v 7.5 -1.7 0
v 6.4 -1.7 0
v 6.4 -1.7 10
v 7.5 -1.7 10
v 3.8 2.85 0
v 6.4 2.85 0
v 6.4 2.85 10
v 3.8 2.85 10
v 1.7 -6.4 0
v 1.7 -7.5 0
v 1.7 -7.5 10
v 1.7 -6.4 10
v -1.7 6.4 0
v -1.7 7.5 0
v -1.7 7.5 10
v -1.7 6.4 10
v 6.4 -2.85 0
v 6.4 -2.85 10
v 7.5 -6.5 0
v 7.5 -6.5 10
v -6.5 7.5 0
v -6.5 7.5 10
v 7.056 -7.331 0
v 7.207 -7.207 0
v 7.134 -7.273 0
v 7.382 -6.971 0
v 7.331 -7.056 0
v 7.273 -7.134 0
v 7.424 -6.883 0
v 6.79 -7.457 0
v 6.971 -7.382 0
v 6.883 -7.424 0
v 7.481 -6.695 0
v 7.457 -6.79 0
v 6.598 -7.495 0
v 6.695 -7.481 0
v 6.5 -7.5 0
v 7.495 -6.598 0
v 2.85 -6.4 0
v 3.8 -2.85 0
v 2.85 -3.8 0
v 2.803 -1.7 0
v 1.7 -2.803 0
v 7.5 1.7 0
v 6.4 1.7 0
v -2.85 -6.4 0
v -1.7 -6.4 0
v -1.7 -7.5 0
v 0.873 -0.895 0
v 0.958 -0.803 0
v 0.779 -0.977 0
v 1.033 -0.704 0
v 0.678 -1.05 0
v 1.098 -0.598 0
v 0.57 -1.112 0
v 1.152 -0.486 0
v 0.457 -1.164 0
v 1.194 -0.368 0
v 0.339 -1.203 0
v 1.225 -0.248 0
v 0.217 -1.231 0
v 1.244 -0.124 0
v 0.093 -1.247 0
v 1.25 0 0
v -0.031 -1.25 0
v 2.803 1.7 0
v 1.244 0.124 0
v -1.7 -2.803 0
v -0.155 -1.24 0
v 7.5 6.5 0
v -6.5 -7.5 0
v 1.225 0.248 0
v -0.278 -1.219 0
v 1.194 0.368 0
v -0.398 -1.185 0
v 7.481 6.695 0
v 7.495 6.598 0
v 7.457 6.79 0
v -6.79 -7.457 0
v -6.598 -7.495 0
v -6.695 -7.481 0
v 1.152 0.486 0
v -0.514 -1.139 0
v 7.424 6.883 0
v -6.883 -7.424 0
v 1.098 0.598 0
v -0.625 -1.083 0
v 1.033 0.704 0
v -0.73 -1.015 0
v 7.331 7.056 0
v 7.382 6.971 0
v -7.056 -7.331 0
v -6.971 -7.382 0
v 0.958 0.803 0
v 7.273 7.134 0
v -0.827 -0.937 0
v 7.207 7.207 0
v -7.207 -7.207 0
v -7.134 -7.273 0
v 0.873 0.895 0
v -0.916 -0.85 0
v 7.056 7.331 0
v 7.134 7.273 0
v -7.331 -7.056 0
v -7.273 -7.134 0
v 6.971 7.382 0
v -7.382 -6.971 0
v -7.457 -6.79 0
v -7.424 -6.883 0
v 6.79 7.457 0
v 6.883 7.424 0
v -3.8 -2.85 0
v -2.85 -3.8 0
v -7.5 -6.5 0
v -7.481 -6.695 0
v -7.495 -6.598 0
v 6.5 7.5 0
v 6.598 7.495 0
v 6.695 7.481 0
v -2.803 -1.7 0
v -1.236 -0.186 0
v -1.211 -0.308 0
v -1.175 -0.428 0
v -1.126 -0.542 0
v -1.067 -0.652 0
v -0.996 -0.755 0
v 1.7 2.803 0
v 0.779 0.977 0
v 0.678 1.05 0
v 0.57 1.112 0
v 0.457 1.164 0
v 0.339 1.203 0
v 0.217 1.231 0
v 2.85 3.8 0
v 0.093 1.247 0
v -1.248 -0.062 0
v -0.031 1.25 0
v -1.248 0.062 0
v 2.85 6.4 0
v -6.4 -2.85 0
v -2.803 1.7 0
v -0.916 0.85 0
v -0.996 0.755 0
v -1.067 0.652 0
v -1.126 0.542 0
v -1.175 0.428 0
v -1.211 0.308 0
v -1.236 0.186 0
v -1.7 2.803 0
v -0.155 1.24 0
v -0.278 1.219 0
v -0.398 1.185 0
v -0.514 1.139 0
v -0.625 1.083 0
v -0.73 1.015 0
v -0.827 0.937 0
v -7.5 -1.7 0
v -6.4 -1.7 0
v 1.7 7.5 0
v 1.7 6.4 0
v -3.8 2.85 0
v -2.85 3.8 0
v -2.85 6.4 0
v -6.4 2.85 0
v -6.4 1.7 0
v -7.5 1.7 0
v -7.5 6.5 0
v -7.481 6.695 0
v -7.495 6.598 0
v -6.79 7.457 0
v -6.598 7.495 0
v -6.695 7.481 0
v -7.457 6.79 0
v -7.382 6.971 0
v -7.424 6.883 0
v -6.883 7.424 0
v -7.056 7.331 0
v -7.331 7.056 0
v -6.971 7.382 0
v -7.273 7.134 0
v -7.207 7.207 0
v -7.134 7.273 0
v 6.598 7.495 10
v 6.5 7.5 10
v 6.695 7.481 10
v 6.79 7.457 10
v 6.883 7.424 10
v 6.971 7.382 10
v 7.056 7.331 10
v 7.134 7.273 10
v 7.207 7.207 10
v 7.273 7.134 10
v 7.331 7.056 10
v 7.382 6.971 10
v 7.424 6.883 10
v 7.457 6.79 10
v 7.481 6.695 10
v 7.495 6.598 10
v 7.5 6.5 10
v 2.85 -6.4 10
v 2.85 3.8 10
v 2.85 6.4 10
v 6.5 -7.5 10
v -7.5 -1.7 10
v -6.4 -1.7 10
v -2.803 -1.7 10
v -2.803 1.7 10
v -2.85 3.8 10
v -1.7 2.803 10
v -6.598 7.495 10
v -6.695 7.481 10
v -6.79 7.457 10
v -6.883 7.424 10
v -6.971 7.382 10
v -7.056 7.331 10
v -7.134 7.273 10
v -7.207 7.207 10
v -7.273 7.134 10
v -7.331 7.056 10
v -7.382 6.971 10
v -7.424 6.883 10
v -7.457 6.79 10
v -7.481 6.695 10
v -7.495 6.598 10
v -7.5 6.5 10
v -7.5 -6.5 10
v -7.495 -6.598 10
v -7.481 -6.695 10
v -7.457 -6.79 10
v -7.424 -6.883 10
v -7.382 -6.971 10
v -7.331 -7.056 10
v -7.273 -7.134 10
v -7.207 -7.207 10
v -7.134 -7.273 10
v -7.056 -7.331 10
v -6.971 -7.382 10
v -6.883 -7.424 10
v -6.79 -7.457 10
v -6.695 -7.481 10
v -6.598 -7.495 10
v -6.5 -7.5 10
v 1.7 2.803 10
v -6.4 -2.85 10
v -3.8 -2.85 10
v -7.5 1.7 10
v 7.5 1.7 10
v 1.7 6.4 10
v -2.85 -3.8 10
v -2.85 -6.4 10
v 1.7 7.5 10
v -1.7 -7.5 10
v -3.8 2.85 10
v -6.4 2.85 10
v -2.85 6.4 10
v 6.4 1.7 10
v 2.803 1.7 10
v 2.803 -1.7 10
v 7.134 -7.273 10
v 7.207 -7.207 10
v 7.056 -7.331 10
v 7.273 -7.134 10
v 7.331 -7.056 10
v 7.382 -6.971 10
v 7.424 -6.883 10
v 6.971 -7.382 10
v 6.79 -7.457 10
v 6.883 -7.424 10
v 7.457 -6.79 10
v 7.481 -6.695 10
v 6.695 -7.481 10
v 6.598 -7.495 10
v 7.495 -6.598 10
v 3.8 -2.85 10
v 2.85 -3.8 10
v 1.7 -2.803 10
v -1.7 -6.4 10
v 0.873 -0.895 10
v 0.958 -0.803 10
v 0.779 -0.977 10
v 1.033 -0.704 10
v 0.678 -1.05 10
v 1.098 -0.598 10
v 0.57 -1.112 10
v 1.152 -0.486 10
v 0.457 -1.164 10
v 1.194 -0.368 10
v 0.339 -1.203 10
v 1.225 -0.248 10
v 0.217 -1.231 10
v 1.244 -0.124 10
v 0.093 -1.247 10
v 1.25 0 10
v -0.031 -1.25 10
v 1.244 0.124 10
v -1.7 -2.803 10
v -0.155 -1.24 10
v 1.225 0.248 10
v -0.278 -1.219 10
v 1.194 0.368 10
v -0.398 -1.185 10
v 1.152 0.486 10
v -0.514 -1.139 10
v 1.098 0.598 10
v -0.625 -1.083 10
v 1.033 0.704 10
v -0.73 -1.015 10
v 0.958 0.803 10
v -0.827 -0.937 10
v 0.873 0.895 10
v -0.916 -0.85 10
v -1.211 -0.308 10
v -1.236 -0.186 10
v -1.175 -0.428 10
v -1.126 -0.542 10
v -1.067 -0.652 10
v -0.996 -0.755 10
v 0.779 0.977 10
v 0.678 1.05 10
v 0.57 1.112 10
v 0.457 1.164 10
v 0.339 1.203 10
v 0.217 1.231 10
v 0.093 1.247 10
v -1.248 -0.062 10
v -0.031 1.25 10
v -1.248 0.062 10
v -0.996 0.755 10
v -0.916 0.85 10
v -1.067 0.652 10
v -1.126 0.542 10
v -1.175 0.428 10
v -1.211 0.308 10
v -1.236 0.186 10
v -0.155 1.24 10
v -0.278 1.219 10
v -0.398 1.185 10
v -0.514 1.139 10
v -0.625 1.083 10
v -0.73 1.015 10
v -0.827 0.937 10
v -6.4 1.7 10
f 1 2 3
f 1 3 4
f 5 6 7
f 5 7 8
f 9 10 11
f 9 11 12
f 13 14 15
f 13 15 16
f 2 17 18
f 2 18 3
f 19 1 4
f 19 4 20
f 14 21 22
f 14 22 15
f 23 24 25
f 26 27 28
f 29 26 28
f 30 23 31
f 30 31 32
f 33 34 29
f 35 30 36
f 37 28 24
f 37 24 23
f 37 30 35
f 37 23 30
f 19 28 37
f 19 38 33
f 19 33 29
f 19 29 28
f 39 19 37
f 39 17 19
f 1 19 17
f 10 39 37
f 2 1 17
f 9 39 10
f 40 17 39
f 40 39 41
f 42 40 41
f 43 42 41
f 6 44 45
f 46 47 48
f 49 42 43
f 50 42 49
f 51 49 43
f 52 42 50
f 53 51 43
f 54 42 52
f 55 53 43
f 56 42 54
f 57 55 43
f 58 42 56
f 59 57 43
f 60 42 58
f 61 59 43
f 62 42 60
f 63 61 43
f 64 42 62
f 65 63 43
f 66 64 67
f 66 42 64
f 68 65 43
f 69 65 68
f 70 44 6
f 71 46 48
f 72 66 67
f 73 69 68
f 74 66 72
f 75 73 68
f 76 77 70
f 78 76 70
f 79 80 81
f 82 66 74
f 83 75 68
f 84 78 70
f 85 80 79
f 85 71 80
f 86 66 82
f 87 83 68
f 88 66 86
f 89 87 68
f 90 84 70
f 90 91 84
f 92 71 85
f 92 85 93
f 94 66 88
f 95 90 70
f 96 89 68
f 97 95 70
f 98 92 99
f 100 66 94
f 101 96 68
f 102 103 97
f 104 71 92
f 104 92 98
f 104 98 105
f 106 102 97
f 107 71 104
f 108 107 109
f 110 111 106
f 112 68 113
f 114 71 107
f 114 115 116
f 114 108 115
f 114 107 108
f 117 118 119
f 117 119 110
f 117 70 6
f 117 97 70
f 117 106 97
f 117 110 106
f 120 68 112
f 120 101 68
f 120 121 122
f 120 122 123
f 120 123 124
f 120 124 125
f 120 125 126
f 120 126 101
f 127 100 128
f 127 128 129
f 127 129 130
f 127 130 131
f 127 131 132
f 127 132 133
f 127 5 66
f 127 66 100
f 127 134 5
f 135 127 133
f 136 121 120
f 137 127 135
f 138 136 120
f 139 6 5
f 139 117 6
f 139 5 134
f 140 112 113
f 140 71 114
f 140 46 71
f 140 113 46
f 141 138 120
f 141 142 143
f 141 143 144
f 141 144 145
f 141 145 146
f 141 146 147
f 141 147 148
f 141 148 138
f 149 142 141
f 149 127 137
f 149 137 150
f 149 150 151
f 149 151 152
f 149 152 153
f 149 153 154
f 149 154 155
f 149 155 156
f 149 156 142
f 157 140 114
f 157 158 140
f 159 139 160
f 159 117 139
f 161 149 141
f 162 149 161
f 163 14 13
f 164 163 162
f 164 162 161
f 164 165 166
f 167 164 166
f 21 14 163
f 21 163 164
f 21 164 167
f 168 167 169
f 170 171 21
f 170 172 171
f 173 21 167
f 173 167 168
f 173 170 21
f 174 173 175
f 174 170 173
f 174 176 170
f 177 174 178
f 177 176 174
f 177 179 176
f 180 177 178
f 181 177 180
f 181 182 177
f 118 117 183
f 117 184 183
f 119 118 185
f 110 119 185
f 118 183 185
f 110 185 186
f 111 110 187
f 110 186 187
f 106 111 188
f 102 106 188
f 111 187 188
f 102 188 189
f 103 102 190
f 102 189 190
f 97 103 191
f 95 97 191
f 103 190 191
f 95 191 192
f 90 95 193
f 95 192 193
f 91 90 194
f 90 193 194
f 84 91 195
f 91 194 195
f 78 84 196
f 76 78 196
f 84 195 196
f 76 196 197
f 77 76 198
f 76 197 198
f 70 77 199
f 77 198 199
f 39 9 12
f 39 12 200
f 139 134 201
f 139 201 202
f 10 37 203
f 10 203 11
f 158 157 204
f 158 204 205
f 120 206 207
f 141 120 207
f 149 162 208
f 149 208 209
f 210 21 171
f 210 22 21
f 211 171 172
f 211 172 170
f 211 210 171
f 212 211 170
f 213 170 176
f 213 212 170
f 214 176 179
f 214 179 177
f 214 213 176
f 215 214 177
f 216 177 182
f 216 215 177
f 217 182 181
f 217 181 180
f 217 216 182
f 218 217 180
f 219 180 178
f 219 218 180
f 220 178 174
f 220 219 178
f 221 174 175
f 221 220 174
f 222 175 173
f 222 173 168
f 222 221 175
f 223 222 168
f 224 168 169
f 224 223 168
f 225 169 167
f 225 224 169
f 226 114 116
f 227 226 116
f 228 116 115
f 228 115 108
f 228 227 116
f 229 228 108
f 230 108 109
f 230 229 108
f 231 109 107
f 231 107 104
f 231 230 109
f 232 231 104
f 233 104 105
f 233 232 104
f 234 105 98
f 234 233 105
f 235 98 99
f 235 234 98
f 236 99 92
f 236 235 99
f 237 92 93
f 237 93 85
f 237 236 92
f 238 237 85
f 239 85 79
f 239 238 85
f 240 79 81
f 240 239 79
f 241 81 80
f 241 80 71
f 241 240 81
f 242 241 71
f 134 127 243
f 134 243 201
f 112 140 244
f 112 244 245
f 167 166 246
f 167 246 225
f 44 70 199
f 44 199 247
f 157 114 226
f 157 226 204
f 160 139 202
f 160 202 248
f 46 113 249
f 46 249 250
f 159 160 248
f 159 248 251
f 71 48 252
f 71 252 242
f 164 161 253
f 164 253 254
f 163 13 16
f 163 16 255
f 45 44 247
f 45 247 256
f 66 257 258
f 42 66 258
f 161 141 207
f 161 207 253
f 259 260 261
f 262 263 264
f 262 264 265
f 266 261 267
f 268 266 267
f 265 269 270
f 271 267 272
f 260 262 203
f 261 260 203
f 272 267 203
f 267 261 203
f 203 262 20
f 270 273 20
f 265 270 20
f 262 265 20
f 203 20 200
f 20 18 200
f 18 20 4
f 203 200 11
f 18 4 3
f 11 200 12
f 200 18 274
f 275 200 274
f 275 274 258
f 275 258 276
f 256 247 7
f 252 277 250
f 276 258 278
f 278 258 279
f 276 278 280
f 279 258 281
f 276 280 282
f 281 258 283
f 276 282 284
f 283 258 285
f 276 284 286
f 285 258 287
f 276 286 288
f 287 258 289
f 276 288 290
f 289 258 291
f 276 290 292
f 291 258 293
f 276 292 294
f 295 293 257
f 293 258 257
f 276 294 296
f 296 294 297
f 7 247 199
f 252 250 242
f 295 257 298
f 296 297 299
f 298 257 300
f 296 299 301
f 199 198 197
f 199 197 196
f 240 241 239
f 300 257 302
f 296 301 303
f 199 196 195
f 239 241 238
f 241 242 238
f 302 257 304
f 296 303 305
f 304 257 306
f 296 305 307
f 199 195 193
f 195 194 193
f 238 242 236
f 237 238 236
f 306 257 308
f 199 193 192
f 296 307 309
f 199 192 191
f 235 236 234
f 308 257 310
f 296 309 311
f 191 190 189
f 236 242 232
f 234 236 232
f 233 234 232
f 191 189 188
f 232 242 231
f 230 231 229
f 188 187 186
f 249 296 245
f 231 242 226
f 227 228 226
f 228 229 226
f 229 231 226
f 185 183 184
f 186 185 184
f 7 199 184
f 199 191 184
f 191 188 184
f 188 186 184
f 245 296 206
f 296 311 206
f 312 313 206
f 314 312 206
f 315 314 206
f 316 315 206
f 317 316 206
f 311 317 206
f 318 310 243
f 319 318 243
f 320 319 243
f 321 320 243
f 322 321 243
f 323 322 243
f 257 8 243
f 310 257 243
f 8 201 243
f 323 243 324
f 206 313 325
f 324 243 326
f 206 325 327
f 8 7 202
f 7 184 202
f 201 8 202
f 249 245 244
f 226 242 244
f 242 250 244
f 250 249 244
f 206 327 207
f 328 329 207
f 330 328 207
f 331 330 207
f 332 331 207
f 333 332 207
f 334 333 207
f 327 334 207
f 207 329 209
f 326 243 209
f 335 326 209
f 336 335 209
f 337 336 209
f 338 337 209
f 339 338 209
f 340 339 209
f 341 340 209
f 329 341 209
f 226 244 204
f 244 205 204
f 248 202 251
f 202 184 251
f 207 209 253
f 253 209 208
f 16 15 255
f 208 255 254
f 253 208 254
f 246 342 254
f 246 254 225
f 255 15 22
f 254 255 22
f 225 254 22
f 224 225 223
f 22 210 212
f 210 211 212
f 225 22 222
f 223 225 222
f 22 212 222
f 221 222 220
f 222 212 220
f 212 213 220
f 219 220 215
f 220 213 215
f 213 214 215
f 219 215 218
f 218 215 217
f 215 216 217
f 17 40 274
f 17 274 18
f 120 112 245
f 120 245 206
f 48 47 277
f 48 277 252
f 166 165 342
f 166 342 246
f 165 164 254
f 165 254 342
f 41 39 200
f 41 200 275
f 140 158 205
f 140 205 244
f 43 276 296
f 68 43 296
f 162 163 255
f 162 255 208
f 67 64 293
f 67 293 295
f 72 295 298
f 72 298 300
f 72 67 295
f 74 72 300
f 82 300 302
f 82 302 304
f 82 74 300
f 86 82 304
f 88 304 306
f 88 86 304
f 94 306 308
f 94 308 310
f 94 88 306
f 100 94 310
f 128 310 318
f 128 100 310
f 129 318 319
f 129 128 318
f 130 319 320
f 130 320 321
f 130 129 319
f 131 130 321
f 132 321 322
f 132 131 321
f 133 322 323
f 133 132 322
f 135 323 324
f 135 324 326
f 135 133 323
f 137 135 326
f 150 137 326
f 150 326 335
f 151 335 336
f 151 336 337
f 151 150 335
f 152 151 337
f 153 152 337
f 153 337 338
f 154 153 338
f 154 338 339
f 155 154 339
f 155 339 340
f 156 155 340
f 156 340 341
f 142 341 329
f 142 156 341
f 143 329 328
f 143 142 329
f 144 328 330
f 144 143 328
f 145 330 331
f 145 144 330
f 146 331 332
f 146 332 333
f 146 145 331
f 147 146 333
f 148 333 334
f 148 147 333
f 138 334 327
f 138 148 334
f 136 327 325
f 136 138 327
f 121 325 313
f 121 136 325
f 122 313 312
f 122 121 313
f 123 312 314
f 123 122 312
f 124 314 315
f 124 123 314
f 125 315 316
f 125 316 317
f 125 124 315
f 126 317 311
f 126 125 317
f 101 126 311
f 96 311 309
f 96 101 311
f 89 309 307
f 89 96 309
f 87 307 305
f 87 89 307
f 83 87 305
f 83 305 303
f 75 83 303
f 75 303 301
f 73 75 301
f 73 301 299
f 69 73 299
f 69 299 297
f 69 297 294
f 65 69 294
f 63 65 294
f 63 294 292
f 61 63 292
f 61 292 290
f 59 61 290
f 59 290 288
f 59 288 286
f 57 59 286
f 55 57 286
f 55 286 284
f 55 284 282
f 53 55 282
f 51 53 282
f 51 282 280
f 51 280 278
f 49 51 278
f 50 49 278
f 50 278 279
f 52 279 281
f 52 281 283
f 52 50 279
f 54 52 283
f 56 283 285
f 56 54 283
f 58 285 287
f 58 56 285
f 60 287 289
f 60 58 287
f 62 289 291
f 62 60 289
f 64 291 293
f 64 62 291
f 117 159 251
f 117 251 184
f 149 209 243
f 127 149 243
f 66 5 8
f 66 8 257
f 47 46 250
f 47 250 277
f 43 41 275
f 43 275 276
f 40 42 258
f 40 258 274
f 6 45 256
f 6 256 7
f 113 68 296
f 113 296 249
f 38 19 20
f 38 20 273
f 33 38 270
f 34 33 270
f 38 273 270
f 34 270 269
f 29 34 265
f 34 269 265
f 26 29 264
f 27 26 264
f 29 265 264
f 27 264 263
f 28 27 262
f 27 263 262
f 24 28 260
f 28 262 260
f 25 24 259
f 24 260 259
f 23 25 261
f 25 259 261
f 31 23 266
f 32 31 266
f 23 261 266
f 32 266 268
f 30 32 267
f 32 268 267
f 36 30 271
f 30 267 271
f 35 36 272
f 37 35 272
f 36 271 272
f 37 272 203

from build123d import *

# Parameters (mm, degrees)
SKETCH_R  = 1.25
PAD_DEPTH = 10
FILLET_R  = 1


with BuildPart() as part:
    # Sketch → Pad (new body)
    with BuildSketch(Plane.XY):
        Polygon((-7.5, 7.5), (-1.7, 7.5), (-1.7, 6.4), (-2.85, 6.4), (-2.85, 3.8), (-1.7, 2.802683), (1.7, 2.802683), (2.85, 3.8), (2.85, 6.4), (1.7, 6.4), (1.7, 7.5), (7.5, 7.5), (7.5, 1.7), (6.4, 1.7), (6.4, 2.85), (3.8, 2.85), (2.802683, 1.7), (2.802683, -1.7), (3.8, -2.85), (6.4, -2.85), (6.4, -1.7), (7.5, -1.7), (7.5, -7.5), (1.7, -7.5), (1.7, -6.4), (2.85, -6.4), (2.85, -3.8), (1.7, -2.802683), (-1.7, -2.802683), (-2.85, -3.8), (-2.85, -6.4), (-1.7, -6.4), (-1.7, -7.5), (-7.5, -7.5), (-7.5, -1.7), (-6.4, -1.7), (-6.4, -2.85), (-3.8, -2.85), (-2.802683, -1.7), (-2.802683, 1.7), (-3.8, 2.85), (-6.4, 2.85), (-6.4, 1.7), (-7.5, 1.7), align=None)
        Circle(SKETCH_R, mode=Mode.SUBTRACT)
    extrude(amount=PAD_DEPTH)

    # Fillet
    fillet_edges = [part.edges().sort_by_distance(p)[0] for p in [
        (-7.5, -7.5, 5),
        (7.5, -7.5, 5),
        (7.5, 7.5, 5),
        (-7.5, 7.5, 5),
    ]]
    fillet(fillet_edges, radius=FILLET_R)


solid = part.part
